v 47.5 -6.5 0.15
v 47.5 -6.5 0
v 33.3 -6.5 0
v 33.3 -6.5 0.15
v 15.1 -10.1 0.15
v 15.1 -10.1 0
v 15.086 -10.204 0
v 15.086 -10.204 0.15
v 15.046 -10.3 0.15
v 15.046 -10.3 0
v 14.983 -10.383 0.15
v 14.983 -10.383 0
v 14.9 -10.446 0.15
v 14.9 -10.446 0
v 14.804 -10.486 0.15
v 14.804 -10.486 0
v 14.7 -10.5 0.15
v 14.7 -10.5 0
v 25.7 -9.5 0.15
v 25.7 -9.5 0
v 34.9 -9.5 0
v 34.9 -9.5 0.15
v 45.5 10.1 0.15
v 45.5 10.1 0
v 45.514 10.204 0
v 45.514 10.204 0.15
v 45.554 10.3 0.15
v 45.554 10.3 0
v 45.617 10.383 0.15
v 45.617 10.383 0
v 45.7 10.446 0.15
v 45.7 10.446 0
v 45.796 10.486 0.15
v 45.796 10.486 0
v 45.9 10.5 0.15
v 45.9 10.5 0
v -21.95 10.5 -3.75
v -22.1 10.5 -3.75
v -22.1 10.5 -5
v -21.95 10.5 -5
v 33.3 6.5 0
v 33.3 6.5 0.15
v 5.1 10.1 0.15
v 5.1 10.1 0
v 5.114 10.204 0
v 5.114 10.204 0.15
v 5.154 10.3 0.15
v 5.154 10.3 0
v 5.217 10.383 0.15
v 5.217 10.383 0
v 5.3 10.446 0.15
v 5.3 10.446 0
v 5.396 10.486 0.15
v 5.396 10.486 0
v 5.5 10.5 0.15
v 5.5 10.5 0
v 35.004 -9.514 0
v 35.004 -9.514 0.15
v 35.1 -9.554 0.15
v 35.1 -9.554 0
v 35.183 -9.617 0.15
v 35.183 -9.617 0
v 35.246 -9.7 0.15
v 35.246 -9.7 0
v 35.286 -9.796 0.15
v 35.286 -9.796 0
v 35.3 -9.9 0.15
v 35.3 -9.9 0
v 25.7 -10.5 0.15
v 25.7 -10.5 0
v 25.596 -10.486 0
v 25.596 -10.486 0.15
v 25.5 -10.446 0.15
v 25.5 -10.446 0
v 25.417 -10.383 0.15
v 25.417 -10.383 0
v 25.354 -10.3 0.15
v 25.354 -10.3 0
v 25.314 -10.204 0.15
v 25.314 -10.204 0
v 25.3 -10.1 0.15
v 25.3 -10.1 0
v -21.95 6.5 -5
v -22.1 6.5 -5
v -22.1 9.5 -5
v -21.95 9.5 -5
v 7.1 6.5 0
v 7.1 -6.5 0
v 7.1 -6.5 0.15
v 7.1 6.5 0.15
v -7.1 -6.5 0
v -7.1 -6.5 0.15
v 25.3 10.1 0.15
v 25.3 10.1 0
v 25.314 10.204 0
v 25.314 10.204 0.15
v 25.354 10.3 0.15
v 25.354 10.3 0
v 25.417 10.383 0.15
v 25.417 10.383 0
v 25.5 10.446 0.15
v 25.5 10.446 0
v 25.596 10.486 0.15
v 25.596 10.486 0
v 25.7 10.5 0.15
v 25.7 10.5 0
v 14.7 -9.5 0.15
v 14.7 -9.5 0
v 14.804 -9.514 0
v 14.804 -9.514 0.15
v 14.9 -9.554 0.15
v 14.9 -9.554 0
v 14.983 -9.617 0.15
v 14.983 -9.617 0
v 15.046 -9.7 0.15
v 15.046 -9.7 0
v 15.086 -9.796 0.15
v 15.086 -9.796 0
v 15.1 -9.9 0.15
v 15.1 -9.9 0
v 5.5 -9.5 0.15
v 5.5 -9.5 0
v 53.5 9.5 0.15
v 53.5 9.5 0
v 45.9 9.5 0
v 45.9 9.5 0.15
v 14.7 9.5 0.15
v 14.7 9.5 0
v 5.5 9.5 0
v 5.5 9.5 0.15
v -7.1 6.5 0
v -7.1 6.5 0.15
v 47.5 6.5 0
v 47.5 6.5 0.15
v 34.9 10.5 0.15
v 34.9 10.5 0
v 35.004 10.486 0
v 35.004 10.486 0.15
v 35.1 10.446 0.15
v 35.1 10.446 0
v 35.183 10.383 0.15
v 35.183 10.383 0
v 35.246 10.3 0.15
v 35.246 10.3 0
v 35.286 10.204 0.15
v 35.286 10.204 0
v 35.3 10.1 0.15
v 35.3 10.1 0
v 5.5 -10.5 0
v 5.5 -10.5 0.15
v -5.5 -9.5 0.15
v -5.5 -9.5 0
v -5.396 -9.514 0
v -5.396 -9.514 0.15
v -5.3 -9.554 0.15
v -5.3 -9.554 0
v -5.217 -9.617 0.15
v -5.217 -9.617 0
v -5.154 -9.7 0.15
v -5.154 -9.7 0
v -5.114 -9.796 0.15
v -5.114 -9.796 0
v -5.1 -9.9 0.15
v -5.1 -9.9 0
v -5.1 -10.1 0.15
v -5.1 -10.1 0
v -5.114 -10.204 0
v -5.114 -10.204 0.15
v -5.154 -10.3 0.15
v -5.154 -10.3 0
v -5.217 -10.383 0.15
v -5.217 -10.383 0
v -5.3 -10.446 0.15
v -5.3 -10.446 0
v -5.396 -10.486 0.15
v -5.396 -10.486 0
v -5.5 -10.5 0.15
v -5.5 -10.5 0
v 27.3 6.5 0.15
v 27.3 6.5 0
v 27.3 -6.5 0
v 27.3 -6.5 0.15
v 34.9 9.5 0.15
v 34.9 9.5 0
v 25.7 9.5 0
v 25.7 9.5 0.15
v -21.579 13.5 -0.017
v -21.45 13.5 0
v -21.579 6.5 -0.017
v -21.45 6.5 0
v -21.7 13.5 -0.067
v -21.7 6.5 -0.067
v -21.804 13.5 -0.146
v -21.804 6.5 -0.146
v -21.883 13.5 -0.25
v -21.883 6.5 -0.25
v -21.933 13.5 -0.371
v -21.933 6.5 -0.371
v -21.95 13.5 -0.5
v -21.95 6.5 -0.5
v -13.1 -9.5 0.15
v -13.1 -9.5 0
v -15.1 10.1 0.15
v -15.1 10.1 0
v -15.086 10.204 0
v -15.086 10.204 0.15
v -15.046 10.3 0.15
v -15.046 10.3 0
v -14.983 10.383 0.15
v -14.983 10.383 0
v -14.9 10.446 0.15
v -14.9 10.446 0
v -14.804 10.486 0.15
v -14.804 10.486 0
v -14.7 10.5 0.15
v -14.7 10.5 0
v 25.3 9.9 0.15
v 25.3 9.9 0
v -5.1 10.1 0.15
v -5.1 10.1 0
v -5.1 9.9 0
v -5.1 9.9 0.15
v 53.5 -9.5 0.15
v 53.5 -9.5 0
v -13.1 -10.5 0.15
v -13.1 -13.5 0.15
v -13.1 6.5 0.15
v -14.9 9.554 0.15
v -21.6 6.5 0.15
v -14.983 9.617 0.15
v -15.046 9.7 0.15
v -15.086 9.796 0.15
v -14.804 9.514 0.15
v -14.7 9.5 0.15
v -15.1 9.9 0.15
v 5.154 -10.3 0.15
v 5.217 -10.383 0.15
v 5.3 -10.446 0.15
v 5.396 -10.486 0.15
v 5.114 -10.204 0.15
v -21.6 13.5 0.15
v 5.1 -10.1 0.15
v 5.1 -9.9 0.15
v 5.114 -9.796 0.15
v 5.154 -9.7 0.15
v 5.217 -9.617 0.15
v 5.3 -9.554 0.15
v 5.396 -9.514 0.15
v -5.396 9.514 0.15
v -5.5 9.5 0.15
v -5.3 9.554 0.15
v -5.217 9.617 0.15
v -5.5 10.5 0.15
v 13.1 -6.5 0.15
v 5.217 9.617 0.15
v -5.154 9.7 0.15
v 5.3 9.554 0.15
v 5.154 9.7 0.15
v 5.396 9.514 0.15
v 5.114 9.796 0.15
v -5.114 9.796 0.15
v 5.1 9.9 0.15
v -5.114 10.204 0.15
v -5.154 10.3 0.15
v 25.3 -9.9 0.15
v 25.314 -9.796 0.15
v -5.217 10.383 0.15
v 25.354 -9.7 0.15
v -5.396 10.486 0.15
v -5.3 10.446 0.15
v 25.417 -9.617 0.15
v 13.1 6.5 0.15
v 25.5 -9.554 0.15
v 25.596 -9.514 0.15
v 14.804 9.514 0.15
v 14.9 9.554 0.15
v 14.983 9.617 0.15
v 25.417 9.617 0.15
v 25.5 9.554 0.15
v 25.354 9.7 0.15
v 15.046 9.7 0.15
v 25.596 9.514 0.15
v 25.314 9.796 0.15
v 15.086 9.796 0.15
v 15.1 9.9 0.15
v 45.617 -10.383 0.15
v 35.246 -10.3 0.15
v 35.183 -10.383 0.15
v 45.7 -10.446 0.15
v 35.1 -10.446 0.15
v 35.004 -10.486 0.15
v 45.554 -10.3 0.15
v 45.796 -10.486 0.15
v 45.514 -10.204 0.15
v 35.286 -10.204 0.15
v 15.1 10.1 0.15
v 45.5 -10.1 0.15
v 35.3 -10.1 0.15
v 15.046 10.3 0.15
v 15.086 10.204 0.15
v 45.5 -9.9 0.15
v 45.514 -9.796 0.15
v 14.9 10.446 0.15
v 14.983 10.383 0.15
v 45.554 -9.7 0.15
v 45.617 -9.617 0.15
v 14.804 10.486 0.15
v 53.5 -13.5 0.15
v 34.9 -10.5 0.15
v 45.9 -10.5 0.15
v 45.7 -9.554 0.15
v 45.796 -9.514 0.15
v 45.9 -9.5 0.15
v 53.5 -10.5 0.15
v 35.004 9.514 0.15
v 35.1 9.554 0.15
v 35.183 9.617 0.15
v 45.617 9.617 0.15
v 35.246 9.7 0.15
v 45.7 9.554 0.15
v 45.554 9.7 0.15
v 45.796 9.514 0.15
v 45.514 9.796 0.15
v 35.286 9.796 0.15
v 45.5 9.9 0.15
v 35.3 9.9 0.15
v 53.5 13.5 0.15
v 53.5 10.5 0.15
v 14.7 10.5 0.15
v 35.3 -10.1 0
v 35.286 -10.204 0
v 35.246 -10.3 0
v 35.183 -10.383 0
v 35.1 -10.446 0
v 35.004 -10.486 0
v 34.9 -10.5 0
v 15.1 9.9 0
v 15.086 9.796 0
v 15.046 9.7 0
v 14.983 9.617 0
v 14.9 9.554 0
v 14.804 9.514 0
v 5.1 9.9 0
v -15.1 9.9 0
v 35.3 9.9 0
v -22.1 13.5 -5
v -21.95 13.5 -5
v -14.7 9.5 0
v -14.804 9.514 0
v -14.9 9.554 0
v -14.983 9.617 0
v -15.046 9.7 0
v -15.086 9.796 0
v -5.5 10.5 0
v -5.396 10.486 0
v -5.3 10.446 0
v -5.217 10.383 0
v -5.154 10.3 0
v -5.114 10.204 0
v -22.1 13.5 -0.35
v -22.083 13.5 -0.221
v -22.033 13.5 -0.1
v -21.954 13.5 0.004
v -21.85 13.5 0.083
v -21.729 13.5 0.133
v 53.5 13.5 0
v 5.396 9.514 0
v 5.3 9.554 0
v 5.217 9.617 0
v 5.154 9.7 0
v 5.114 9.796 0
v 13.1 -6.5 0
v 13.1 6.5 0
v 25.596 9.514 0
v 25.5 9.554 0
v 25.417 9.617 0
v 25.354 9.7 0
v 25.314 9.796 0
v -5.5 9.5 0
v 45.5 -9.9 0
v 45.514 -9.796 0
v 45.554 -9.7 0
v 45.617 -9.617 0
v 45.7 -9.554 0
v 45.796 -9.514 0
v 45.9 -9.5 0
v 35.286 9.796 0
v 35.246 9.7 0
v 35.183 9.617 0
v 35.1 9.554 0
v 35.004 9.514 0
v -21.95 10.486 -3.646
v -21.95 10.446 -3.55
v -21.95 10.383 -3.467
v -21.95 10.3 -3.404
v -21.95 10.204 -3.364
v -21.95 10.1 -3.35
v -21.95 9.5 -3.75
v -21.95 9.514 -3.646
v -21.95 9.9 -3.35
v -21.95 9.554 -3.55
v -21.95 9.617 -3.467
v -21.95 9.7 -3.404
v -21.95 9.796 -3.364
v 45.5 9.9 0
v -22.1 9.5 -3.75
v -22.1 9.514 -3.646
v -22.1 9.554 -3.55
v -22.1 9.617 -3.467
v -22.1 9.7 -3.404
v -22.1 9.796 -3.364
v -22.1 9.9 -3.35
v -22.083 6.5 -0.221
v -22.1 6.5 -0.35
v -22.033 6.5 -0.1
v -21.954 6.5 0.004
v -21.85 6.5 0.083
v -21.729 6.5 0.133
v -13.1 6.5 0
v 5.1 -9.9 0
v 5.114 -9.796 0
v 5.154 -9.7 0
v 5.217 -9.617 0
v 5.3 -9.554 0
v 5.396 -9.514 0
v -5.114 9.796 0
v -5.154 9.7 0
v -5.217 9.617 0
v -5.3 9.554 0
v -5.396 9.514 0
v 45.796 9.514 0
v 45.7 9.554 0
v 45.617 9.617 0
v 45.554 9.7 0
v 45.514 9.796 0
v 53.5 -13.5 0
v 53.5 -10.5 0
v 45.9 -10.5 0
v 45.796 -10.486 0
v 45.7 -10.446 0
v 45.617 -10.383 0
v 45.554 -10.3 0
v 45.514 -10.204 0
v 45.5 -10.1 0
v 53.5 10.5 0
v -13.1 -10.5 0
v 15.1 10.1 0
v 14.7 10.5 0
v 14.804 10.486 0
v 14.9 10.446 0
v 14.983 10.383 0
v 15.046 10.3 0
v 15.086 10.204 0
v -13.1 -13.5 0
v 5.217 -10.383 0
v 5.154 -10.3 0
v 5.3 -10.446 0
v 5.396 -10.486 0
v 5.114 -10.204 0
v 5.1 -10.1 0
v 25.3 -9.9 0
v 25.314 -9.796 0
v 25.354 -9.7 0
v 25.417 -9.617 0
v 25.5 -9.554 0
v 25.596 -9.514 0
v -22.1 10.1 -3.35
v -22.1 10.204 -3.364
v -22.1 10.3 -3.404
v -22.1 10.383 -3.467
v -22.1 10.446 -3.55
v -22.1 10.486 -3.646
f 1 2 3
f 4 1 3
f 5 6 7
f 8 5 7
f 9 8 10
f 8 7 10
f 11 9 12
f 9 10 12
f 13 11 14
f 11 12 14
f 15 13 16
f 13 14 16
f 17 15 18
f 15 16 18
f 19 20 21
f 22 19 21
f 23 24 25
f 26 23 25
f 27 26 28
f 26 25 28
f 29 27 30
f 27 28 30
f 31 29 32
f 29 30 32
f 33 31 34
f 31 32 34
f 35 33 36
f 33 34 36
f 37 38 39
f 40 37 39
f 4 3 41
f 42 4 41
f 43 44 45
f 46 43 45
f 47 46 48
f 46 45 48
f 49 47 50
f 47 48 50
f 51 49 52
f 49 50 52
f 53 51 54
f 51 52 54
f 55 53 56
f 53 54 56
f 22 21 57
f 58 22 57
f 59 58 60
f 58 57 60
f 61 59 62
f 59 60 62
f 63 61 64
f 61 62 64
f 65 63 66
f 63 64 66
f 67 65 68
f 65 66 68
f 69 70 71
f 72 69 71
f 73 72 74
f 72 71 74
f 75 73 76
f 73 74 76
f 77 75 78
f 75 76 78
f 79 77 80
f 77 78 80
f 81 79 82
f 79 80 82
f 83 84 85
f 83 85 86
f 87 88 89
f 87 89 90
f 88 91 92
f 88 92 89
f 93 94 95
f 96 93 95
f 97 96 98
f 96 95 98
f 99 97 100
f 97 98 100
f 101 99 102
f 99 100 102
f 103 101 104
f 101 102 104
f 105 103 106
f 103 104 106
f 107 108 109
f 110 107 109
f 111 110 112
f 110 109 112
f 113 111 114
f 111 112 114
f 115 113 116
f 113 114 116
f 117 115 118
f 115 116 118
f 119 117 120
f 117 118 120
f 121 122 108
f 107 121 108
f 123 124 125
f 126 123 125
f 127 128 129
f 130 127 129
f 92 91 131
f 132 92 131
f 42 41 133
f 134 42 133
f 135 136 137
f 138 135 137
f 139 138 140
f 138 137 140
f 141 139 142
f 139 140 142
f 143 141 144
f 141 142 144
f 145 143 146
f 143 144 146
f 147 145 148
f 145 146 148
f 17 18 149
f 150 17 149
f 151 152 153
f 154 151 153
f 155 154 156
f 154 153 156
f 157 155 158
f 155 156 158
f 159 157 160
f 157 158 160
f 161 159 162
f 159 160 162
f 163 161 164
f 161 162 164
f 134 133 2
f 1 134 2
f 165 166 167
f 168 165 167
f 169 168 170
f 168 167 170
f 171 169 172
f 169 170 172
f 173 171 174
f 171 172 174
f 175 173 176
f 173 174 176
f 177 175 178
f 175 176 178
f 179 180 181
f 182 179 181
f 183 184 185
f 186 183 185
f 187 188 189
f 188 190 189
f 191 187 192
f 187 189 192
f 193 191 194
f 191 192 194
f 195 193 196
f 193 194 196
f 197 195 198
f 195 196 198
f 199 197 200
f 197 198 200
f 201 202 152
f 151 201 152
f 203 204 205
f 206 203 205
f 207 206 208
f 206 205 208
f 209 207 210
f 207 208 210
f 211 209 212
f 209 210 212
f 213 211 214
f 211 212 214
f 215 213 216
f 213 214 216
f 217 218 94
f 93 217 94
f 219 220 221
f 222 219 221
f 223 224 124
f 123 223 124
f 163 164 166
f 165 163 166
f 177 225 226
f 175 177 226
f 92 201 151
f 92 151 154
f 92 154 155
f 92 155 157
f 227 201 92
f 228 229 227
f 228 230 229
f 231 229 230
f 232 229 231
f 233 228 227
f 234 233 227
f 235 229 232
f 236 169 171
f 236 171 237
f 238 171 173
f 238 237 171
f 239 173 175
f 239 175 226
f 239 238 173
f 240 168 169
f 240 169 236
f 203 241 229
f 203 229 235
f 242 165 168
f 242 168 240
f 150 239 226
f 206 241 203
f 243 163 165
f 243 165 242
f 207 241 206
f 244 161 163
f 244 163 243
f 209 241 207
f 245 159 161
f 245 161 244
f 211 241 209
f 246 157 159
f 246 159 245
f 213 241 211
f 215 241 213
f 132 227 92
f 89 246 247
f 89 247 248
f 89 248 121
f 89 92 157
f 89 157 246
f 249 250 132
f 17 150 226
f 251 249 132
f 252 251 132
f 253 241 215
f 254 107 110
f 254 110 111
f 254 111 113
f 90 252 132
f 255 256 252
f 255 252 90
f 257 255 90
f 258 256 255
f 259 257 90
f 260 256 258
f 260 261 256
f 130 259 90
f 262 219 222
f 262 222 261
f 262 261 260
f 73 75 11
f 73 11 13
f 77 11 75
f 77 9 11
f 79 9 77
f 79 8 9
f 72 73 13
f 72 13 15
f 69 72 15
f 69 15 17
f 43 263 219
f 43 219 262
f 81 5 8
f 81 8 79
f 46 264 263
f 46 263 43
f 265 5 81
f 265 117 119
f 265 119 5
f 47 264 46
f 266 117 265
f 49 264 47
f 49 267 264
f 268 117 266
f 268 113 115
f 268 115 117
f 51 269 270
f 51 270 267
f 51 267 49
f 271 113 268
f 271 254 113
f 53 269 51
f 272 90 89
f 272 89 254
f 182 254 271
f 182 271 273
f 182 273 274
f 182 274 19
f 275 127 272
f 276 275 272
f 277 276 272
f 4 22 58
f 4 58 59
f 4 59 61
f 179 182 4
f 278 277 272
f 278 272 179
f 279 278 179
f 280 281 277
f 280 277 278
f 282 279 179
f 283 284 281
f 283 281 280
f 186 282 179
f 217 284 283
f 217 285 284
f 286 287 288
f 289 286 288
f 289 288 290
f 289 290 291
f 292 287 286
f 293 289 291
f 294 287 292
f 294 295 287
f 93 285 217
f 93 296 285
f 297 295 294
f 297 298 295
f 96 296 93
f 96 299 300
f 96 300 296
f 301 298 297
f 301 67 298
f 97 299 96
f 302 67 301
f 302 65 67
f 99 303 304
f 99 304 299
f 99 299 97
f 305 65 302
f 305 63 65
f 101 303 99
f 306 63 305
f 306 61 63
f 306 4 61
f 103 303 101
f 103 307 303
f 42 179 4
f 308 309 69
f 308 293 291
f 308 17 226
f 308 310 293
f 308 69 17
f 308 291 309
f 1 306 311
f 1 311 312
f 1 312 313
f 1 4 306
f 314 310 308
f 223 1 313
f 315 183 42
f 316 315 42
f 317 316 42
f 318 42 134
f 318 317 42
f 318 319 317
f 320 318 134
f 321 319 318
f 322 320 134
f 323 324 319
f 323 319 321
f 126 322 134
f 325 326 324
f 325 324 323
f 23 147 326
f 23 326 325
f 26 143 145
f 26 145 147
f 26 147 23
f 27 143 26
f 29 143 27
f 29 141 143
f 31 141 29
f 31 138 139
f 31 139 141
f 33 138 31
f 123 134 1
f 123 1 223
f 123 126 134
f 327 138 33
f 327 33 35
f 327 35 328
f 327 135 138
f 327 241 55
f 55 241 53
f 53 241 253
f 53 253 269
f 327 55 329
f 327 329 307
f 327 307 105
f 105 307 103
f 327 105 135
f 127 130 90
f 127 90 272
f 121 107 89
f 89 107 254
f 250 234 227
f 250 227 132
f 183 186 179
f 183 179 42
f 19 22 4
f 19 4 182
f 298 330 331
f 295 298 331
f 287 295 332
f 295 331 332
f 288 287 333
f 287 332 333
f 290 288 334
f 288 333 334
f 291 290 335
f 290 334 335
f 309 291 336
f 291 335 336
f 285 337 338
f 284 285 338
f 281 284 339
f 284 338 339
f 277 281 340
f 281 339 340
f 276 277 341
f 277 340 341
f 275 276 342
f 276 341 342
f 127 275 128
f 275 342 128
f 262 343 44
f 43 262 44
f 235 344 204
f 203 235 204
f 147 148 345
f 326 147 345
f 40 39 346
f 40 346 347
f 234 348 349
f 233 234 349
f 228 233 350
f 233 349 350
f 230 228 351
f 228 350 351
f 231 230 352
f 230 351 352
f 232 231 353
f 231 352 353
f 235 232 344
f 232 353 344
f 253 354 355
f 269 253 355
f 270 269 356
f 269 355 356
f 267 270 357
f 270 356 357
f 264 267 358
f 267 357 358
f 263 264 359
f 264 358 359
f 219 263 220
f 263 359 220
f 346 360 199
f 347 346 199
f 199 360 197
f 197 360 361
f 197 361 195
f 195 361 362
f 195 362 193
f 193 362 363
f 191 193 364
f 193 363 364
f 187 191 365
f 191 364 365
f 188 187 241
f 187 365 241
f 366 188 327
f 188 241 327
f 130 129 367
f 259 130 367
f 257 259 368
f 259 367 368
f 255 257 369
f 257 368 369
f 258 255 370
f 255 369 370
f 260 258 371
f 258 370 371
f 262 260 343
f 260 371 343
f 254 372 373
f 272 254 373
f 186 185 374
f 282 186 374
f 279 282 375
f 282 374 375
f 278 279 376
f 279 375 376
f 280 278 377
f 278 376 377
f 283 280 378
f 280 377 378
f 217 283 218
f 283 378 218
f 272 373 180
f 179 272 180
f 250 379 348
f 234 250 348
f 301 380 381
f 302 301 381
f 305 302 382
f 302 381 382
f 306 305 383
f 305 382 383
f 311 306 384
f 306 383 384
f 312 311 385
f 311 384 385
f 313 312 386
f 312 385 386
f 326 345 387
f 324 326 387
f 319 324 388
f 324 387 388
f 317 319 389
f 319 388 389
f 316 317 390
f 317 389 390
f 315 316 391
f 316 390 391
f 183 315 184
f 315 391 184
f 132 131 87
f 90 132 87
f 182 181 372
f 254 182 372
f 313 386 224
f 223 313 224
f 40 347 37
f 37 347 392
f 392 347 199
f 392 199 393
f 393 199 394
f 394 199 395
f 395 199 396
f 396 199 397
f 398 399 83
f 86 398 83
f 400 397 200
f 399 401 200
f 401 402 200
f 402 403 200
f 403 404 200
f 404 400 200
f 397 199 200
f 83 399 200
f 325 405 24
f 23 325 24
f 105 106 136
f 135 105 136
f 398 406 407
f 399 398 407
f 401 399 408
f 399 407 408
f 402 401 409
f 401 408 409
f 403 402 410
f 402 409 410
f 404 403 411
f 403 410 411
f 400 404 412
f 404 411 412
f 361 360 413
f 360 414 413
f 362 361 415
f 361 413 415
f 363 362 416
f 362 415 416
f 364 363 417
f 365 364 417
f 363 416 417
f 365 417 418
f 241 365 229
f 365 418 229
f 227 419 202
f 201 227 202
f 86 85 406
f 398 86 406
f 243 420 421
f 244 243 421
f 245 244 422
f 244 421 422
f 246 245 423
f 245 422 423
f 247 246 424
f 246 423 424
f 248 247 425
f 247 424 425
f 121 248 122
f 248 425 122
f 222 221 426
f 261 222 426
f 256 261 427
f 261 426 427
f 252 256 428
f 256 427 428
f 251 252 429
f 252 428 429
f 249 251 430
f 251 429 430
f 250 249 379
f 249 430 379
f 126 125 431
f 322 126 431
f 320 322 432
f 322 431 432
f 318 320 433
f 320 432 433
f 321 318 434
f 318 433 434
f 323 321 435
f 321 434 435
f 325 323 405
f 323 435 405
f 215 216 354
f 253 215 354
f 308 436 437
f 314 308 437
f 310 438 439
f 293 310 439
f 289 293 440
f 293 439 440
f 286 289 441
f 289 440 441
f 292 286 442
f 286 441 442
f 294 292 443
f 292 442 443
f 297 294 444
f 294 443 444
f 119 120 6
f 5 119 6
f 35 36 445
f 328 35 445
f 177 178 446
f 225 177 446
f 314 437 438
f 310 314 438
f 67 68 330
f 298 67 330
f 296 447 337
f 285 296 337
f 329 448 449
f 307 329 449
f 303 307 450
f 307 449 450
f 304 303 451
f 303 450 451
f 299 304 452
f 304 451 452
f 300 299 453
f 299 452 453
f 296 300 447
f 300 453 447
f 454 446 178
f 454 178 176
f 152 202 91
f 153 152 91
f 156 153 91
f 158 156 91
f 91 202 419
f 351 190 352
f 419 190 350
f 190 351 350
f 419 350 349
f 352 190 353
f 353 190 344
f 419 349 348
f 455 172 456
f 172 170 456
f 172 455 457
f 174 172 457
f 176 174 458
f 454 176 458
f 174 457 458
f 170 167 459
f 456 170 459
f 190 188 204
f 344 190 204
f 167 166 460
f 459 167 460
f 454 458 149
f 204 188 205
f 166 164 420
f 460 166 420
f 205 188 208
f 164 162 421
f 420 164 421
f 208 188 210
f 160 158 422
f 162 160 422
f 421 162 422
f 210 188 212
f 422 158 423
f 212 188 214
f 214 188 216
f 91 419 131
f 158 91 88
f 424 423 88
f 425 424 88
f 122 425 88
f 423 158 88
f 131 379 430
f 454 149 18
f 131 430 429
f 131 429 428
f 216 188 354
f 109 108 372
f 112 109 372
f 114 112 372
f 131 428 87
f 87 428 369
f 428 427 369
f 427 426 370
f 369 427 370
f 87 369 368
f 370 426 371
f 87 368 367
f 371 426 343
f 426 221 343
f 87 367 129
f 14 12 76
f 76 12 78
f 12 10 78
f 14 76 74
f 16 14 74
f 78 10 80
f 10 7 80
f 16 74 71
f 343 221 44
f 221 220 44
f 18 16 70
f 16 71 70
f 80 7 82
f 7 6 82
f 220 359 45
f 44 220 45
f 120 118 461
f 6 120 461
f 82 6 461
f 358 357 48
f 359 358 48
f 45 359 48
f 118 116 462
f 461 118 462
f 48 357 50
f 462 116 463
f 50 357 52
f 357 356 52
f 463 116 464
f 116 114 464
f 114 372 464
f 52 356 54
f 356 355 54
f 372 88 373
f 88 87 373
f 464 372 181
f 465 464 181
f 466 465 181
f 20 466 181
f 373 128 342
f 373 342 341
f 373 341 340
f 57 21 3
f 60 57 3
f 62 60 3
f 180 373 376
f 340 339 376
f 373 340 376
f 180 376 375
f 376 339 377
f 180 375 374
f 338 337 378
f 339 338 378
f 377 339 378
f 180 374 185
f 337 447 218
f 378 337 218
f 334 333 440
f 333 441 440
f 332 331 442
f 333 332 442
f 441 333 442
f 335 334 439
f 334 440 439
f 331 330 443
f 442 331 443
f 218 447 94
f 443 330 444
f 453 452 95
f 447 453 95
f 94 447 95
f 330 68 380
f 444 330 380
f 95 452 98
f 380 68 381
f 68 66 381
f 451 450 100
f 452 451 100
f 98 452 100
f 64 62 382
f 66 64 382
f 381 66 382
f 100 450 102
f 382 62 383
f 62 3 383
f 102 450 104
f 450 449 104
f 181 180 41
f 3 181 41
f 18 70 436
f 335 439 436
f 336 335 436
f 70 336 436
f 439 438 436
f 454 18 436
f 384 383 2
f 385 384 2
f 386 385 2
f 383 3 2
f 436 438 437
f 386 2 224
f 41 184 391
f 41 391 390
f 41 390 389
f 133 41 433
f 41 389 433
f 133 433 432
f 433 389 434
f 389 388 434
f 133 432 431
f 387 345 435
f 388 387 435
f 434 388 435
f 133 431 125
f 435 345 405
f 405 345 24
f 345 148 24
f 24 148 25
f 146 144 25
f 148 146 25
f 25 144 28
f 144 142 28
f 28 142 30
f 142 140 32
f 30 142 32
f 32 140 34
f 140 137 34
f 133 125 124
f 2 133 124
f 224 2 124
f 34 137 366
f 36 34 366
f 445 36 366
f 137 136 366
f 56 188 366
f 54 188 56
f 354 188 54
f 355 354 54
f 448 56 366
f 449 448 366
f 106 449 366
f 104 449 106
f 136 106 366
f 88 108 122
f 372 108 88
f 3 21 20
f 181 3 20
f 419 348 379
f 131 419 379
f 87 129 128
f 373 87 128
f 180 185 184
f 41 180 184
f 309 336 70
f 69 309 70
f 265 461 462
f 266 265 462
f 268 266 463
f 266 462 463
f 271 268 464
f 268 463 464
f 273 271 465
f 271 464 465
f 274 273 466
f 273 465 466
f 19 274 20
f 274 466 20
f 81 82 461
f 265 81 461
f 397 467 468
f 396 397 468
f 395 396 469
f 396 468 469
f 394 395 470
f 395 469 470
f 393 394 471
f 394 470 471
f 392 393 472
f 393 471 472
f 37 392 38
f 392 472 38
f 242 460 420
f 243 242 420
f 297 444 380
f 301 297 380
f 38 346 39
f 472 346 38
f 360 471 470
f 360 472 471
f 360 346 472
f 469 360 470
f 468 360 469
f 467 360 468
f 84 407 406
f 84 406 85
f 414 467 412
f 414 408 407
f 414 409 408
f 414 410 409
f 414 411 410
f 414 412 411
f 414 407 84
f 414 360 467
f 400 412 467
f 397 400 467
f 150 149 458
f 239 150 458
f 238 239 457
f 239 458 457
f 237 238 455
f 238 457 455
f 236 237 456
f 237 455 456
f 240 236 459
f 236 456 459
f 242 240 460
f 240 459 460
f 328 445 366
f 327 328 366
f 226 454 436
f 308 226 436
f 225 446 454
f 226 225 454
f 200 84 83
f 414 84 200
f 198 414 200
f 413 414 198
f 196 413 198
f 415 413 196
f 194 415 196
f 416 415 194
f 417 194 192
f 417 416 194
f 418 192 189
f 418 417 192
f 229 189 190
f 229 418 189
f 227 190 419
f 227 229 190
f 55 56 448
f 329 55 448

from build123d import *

# Parameters (mm, degrees)
F0_W     = 14.2
F0_H     = 13
F1_DEPTH = 0.15
F2_W     = 0.15
F2_H     = 7
F3_DEPTH = 5
F4_R     = 0.5
F6_DEPTH = 25


with BuildPart() as f1:
    # F0 (on Top) → F1 (new body)
    with BuildSketch(Plane.XY):
        with BuildLine():
            Line((-13.1, 10.5), (-13.1, 13.5))
            Line((-13.1, 13.5), (-22.1, 13.5))
            Line((-22.1, 13.5), (-22.1, 6.5))
            Line((-22.1, 6.5), (-13.1, 6.5))
            Line((-13.1, 6.5), (-13.1, 9.5))
            Line((-13.1, 9.5), (-14.7, 9.5))
            ThreePointArc((-14.7, 9.5), (-14.9828427125, 9.6171572875), (-15.1, 9.9))
            Line((-15.1, 9.9), (-15.1, 10.1))
            ThreePointArc((-15.1, 10.1), (-14.9828427125, 10.3828427125), (-14.7, 10.5))
            Line((-14.7, 10.5), (-13.1, 10.5))
        make_face()
        with BuildLine():
            Line((53.5, 13.5), (33.3, 13.5))
            Line((33.3, 13.5), (33.3, 10.5))
            Line((33.3, 10.5), (34.9, 10.5))
            ThreePointArc((34.9, 10.5), (35.1828427125, 10.3828427125), (35.3, 10.1))
            Line((35.3, 10.1), (35.3, 9.9))
            ThreePointArc((35.3, 9.9), (35.1828427125, 9.6171572875), (34.9, 9.5))
            Line((34.9, 9.5), (33.3, 9.5))
            Line((33.3, 9.5), (33.3, 6.5))
            Line((33.3, 6.5), (47.5, 6.5))
            Line((47.5, 6.5), (47.5, -6.5))
            Line((47.5, -6.5), (33.3, -6.5))
            Line((33.3, -6.5), (33.3, -9.5))
            Line((33.3, -9.5), (34.9, -9.5))
            ThreePointArc((34.9, -9.5), (35.1828427125, -9.6171572875), (35.3, -9.9))
            Line((35.3, -9.9), (35.3, -10.1))
            ThreePointArc((35.3, -10.1), (35.1828427125, -10.3828427125), (34.9, -10.5))
            Line((34.9, -10.5), (33.3, -10.5))
            Line((33.3, -10.5), (33.3, -13.5))
            Line((33.3, -13.5), (53.5, -13.5))
            Line((53.5, -13.5), (53.5, -10.5))
            Line((53.5, -10.5), (45.9, -10.5))
            ThreePointArc((45.9, -10.5), (45.6171572875, -10.3828427125), (45.5, -10.1))
            Line((45.5, -10.1), (45.5, -9.9))
            ThreePointArc((45.5, -9.9), (45.6171572875, -9.6171572875), (45.9, -9.5))
            Line((45.9, -9.5), (53.5, -9.5))
            Line((53.5, -9.5), (53.5, 0))
            Line((53.5, 0), (53.5, 9.5))
            Line((53.5, 9.5), (45.9, 9.5))
            ThreePointArc((45.9, 9.5), (45.6171572875, 9.6171572875), (45.5, 9.9))
            Line((45.5, 9.9), (45.5, 10.1))
            ThreePointArc((45.5, 10.1), (45.6171572875, 10.3828427125), (45.9, 10.5))
            Line((45.9, 10.5), (53.5, 10.5))
            Line((53.5, 10.5), (53.5, 13.5))
        make_face()
        with BuildLine():
            Line((13.1, 10.5), (13.1, 13.5))
            Line((13.1, 13.5), (-7.1, 13.5))
            Line((-7.1, 13.5), (-13.1, 13.5))
            Line((-13.1, 13.5), (-13.1, 10.5))
            Line((-13.1, 10.5), (-5.5, 10.5))
            ThreePointArc((-5.5, 10.5), (-5.2171572875, 10.3828427125), (-5.1, 10.1))
            Line((-5.1, 10.1), (-5.1, 9.9))
            ThreePointArc((-5.1, 9.9), (-5.2171572875, 9.6171572875), (-5.5, 9.5))
            Line((-5.5, 9.5), (-13.1, 9.5))
            Line((-13.1, 9.5), (-13.1, 6.5))
            Line((-13.1, 6.5), (-13.1, 0))
            Line((-13.1, 0), (-13.1, -6.5))
            Line((-13.1, -6.5), (-13.1, -9.5))
            Line((-13.1, -9.5), (-5.5, -9.5))
            ThreePointArc((-5.5, -9.5), (-5.2171572875, -9.6171572875), (-5.1, -9.9))
            Line((-5.1, -9.9), (-5.1, -10.1))
            ThreePointArc((-5.1, -10.1), (-5.2171572875, -10.3828427125), (-5.5, -10.5))
            Line((-5.5, -10.5), (-13.1, -10.5))
            Line((-13.1, -10.5), (-13.1, -13.5))
            Line((-13.1, -13.5), (-7.1, -13.5))
            Line((-7.1, -13.5), (13.1, -13.5))
            Line((13.1, -13.5), (13.1, -10.5))
            Line((13.1, -10.5), (5.5, -10.5))
            ThreePointArc((5.5, -10.5), (5.2171572875, -10.3828427125), (5.1, -10.1))
            Line((5.1, -10.1), (5.1, -9.9))
            ThreePointArc((5.1, -9.9), (5.2171572875, -9.6171572875), (5.5, -9.5))
            Line((5.5, -9.5), (13.1, -9.5))
            Line((13.1, -9.5), (13.1, -6.5))
            Line((13.1, -6.5), (13.1, 0))
            Line((13.1, 0), (13.1, 6.5))
            Line((13.1, 6.5), (13.1, 9.5))
            Line((13.1, 9.5), (5.5, 9.5))
            ThreePointArc((5.5, 9.5), (5.2171572875, 9.6171572875), (5.1, 9.9))
            Line((5.1, 9.9), (5.1, 10.1))
            ThreePointArc((5.1, 10.1), (5.2171572875, 10.3828427125), (5.5, 10.5))
            Line((5.5, 10.5), (13.1, 10.5))
        make_face()
        Rectangle(F0_W, F0_H, mode=Mode.SUBTRACT)
        with BuildLine():
            Line((33.3, 13.5), (13.1, 13.5))
            Line((13.1, 13.5), (13.1, 10.5))
            Line((13.1, 10.5), (14.7, 10.5))
            ThreePointArc((14.7, 10.5), (14.9828427125, 10.3828427125), (15.1, 10.1))
            Line((15.1, 10.1), (15.1, 9.9))
            ThreePointArc((15.1, 9.9), (14.9828427125, 9.6171572875), (14.7, 9.5))
            Line((14.7, 9.5), (13.1, 9.5))
            Line((13.1, 9.5), (13.1, 6.5))
            Line((13.1, 6.5), (27.3, 6.5))
            Line((27.3, 6.5), (27.3, -6.5))
            Line((27.3, -6.5), (13.1, -6.5))
            Line((13.1, -6.5), (13.1, -9.5))
            Line((13.1, -9.5), (14.7, -9.5))
            ThreePointArc((14.7, -9.5), (14.9828427125, -9.6171572875), (15.1, -9.9))
            Line((15.1, -9.9), (15.1, -10.1))
            ThreePointArc((15.1, -10.1), (14.9828427125, -10.3828427125), (14.7, -10.5))
            Line((14.7, -10.5), (13.1, -10.5))
            Line((13.1, -10.5), (13.1, -13.5))
            Line((13.1, -13.5), (33.3, -13.5))
            Line((33.3, -13.5), (33.3, -10.5))
            Line((33.3, -10.5), (25.7, -10.5))
            ThreePointArc((25.7, -10.5), (25.4171572875, -10.3828427125), (25.3, -10.1))
            Line((25.3, -10.1), (25.3, -9.9))
            ThreePointArc((25.3, -9.9), (25.4171572875, -9.6171572875), (25.7, -9.5))
            Line((25.7, -9.5), (33.3, -9.5))
            Line((33.3, -9.5), (33.3, -6.5))
            Line((33.3, -6.5), (33.3, 0))
            Line((33.3, 0), (33.3, 6.5))
            Line((33.3, 6.5), (33.3, 9.5))
            Line((33.3, 9.5), (25.7, 9.5))
            ThreePointArc((25.7, 9.5), (25.4171572875, 9.6171572875), (25.3, 9.9))
            Line((25.3, 9.9), (25.3, 10.1))
            ThreePointArc((25.3, 10.1), (25.4171572875, 10.3828427125), (25.7, 10.5))
            Line((25.7, 10.5), (33.3, 10.5))
            Line((33.3, 10.5), (33.3, 13.5))
        make_face()
    extrude(amount=F1_DEPTH)

    # F2 (on face) → F3 (join)
    with BuildSketch(Plane(origin=(0, 0, 0), x_dir=(1, 0, 0), z_dir=(0, 0, -1))):
        with Locations((-22.025, -10)):
            Rectangle(F2_W, F2_H)
    extrude(amount=F3_DEPTH)

    # F4
    f4_edges = [f1.edges().sort_by_distance(p)[0] for p in [
        (-21.95, 10, 0),
        (-22.1, 10, 0.15),
    ]]
    fillet(f4_edges, radius=F4_R)

    # F5 (on face) → F6 (cut)
    with BuildSketch(Plane(origin=(-22.1, 0, 0), x_dir=(0, -1, 0), z_dir=(-1, 0, 0))):
        with BuildLine():
            Line((-9.9, -3.35), (-10, -3.35))
            Line((-10, -3.35), (-10.1, -3.35))
            ThreePointArc((-10.1, -3.35), (-10.3828427125, -3.4671572875), (-10.5, -3.75))
            Line((-10.5, -3.75), (-10.5, -5))
            Line((-10.5, -5), (-9.5, -5))
            Line((-9.5, -5), (-9.5, -3.75))
            ThreePointArc((-9.5, -3.75), (-9.6171572875, -3.4671572875), (-9.9, -3.35))
        make_face()
    extrude(amount=-F6_DEPTH, mode=Mode.SUBTRACT)


solid = f1.part
